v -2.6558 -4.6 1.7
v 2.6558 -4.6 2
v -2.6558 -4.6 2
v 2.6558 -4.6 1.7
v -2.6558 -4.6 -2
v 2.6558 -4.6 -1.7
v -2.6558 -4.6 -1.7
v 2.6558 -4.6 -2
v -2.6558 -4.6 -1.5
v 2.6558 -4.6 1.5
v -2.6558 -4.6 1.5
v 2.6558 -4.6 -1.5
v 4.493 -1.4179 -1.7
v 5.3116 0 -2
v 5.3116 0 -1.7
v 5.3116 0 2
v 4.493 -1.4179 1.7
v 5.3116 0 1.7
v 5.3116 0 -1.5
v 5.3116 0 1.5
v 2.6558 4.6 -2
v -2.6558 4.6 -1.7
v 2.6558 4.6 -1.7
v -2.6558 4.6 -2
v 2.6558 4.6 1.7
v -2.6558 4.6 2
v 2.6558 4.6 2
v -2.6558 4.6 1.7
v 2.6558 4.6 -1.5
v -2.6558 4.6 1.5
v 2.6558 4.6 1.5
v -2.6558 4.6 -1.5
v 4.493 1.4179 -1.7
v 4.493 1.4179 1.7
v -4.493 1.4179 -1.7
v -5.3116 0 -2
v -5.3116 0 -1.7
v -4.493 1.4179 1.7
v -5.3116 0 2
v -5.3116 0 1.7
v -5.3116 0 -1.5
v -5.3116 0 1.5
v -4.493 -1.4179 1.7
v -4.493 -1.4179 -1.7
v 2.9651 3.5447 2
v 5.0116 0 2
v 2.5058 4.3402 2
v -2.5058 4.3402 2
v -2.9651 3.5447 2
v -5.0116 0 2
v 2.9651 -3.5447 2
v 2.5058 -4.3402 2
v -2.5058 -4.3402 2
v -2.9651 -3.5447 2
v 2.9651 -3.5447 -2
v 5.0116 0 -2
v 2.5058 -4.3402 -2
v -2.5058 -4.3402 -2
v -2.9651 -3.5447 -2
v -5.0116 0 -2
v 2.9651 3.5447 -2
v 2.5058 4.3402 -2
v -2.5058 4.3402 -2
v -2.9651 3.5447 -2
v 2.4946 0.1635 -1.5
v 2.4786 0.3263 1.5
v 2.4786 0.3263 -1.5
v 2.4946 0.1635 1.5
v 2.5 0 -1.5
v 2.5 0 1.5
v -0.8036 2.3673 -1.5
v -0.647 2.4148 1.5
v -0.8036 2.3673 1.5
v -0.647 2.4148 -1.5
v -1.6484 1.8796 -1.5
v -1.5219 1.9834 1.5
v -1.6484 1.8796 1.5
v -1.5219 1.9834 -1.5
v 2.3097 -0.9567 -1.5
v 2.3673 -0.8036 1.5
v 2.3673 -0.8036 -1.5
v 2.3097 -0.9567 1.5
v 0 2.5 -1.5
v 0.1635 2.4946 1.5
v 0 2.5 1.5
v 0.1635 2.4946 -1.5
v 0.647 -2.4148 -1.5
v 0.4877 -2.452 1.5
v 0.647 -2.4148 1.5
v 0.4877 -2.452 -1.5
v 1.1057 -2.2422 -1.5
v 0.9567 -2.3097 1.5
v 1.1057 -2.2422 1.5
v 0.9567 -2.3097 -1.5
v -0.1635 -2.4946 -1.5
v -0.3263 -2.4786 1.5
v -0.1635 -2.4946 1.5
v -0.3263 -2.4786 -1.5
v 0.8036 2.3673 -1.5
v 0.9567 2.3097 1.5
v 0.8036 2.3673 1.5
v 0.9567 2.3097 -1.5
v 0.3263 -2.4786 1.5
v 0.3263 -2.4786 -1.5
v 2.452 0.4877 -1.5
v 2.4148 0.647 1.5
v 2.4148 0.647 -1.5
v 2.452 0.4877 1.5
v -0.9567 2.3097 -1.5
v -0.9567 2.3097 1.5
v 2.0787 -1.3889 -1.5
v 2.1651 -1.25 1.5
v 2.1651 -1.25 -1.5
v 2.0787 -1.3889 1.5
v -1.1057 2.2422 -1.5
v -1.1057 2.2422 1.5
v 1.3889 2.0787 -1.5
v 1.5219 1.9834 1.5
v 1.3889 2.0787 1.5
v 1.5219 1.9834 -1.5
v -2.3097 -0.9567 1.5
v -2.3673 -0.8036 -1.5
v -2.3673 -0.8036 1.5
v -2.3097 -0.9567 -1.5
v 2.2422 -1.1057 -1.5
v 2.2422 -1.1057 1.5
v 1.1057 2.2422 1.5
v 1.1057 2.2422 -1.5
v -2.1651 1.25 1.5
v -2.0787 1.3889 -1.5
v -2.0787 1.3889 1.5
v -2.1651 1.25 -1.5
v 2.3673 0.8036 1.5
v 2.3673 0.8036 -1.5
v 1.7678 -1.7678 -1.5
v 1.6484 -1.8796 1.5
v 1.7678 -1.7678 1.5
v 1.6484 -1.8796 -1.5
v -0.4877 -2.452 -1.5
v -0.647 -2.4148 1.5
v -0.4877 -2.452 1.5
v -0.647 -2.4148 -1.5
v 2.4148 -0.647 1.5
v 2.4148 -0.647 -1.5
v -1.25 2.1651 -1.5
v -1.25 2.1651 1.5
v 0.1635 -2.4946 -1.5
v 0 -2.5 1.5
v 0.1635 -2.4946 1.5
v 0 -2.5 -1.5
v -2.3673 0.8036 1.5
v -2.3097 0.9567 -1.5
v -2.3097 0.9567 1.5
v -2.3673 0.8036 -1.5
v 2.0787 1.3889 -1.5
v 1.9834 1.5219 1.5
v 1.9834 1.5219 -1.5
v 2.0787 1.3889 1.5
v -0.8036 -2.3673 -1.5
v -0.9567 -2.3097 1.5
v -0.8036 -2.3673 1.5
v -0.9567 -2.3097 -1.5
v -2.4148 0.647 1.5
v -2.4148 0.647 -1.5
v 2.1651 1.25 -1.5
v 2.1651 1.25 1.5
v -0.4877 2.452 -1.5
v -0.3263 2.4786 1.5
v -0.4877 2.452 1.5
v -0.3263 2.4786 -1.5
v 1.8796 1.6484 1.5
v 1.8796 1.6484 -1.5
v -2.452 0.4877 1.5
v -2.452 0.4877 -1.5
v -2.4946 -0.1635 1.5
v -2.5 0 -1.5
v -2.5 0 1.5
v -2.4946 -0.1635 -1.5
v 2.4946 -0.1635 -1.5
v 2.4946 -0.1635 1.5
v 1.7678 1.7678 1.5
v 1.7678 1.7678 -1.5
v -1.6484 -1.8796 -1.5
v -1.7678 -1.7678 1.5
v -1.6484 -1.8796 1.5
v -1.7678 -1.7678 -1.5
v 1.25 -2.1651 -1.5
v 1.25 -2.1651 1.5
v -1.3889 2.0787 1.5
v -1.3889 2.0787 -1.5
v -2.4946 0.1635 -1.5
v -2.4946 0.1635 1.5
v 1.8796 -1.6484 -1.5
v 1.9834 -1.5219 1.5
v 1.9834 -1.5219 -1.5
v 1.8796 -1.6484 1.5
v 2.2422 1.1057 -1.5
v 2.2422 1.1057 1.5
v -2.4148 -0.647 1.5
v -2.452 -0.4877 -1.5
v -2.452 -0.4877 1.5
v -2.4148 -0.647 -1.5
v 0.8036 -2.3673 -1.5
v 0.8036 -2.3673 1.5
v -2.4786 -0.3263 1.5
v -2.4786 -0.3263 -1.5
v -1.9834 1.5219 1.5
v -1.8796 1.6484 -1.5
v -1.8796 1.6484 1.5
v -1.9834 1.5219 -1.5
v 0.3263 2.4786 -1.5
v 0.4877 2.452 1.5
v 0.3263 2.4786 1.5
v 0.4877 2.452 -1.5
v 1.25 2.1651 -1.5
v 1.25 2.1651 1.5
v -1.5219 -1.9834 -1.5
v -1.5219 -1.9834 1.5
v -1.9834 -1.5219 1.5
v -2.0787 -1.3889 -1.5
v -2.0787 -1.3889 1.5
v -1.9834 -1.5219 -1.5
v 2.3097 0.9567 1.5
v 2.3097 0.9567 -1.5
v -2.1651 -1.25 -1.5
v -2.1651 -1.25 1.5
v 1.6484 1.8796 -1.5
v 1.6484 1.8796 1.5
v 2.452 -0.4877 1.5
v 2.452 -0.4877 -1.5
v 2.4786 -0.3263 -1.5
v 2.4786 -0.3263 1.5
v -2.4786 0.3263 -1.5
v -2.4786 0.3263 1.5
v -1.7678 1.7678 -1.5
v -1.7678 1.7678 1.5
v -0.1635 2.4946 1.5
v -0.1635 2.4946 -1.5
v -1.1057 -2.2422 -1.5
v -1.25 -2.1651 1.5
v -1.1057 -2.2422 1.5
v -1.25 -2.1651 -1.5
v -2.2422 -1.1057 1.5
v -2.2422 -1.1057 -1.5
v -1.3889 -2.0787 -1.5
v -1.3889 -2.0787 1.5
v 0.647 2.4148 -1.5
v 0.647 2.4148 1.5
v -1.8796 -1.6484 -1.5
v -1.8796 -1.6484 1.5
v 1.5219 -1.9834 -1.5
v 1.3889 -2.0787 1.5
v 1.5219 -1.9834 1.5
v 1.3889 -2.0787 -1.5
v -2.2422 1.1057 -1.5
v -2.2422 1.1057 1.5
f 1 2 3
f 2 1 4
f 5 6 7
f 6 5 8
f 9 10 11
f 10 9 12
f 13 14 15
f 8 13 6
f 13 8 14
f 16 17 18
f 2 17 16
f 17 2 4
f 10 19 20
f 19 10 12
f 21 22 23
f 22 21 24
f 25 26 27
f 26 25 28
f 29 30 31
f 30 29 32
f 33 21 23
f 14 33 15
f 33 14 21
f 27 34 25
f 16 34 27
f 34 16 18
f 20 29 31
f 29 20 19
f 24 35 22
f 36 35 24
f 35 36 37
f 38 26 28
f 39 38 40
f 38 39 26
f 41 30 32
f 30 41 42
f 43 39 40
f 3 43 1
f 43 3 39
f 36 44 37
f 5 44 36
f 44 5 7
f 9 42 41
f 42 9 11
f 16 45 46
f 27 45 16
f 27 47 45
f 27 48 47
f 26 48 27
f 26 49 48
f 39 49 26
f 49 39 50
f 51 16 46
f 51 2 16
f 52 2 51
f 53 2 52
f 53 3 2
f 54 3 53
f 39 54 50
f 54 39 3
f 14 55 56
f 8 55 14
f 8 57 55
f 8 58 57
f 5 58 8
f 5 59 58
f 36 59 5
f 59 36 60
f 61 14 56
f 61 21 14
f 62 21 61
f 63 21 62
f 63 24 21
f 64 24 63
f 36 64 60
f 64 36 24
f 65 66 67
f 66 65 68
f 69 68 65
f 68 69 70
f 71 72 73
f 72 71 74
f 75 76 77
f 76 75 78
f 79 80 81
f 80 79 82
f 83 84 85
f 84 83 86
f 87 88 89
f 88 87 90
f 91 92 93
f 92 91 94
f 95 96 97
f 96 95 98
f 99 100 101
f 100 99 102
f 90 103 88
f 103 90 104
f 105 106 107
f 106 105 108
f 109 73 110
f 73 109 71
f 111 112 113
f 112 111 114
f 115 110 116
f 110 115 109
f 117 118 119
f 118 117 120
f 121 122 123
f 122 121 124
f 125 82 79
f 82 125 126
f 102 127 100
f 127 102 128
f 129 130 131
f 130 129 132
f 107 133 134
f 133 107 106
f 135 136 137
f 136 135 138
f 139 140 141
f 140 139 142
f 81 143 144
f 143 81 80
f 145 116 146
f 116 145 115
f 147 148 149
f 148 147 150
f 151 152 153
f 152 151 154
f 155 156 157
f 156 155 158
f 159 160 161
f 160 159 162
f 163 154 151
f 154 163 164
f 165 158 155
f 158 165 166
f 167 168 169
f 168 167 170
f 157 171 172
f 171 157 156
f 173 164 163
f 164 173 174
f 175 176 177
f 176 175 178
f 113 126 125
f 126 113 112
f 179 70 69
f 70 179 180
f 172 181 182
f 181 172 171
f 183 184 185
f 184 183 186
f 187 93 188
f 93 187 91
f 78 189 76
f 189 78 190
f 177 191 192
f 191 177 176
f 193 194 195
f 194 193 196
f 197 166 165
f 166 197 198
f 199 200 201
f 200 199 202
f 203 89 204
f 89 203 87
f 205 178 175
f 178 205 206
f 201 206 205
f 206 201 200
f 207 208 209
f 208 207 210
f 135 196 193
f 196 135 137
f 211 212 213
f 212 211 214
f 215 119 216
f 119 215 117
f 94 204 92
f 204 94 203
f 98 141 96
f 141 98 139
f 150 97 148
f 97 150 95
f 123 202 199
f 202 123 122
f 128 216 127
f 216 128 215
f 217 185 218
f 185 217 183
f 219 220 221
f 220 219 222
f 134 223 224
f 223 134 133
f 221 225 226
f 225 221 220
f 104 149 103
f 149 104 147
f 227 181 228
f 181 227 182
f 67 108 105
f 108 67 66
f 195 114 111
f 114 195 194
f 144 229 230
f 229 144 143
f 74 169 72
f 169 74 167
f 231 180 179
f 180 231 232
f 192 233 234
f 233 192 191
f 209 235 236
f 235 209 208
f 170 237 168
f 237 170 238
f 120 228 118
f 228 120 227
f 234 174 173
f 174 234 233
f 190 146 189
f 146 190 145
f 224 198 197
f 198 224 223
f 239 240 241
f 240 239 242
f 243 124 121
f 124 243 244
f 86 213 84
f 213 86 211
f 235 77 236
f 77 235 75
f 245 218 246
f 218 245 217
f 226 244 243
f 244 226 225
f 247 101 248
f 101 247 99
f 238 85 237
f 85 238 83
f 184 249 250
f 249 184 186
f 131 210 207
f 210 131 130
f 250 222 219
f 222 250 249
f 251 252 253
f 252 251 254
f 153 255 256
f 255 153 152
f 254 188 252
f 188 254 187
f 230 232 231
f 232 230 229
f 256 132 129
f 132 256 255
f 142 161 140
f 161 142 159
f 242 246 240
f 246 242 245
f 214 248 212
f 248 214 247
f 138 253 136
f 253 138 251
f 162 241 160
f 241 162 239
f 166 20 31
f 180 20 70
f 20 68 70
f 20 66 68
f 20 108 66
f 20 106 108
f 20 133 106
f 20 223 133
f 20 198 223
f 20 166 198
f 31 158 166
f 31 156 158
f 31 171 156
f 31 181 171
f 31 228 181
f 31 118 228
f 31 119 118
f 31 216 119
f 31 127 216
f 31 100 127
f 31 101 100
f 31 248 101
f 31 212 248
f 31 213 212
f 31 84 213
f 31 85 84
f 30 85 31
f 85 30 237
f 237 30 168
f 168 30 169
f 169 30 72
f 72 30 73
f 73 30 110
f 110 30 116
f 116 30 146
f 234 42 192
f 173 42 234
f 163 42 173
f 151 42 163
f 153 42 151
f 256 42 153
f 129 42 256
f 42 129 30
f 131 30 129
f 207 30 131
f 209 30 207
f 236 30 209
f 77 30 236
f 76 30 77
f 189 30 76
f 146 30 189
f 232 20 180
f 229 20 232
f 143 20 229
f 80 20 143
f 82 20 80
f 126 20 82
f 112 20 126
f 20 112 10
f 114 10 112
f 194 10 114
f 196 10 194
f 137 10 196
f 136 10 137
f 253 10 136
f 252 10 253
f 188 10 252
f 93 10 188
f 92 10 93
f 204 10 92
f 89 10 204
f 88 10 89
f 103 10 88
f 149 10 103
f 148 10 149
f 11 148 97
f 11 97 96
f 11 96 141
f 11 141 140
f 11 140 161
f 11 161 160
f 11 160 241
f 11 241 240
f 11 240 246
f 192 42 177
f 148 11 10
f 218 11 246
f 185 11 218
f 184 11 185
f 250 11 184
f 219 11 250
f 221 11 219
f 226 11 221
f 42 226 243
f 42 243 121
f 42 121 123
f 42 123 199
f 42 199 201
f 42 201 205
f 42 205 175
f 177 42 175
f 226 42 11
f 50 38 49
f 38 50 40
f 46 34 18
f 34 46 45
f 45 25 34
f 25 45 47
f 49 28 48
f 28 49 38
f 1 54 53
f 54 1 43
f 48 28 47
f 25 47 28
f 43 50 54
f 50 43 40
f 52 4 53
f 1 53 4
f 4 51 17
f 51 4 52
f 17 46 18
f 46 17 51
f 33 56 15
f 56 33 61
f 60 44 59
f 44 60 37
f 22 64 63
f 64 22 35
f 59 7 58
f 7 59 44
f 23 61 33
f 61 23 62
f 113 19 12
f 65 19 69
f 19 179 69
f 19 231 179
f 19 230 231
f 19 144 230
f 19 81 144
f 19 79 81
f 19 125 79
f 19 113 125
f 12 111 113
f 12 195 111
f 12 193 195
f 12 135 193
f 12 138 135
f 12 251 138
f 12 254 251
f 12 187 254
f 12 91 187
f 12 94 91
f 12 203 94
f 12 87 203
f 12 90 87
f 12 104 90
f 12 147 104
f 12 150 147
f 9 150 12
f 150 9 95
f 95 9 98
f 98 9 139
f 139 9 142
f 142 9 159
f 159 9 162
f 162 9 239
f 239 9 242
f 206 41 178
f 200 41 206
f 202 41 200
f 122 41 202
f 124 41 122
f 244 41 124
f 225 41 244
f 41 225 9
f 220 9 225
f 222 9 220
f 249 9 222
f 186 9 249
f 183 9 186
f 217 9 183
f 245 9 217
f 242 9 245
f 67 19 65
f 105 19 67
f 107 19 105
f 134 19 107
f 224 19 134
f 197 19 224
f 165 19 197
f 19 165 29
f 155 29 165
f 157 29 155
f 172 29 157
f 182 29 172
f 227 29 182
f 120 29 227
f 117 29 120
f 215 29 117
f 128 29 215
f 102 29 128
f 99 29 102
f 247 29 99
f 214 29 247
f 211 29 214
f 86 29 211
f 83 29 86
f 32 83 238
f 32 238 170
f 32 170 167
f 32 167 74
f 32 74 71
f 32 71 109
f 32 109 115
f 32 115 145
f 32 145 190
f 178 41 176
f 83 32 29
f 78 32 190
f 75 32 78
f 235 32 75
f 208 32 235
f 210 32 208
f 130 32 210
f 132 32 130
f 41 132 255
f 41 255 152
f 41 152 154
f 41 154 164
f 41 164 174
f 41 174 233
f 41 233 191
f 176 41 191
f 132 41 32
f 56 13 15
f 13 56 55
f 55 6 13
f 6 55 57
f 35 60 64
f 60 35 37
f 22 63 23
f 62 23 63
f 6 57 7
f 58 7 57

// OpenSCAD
// Hex nut for 5.0mm screws: 9.2mm across flats, 4.0mm thick, 5.0mm through hole

across_flats   = 9.2;   // mm
thickness      = 4.0;   // mm
hole_diameter  = 5.0;   // mm
chamfer_size   = 0.4;   // mm (per face)
overlap        = 0.2;   // mm (boolean safety overlap)

// Derived
hex_R  = across_flats / sqrt(3);  // circumradius for a hex with given across-flats
hole_r = hole_diameter / 2;

module hex_nut() {
    difference() {
        // Outer hex prism (flats aligned to X/Y so top/bottom views are hex)
        cylinder(r=hex_R, h=thickness, center=true, $fn=6);

        // Through hole
        cylinder(r=hole_r, h=thickness + 2*overlap, center=true, $fn=96);

        // Top chamfer (remove material near outer edge)
        translate([0, 0, thickness/2 - chamfer_size/2])
            cylinder(
                r1 = hex_R + overlap,
                r2 = max(hole_r, hex_R - chamfer_size),
                h  = chamfer_size + overlap,
                center = true,
                $fn = 6
            );

        // Bottom chamfer
        translate([0, 0, -thickness/2 + chamfer_size/2])
            cylinder(
                r1 = max(hole_r, hex_R - chamfer_size),
                r2 = hex_R + overlap,
                h  = chamfer_size + overlap,
                center = true,
                $fn = 6
            );
    }
}

color("Silver") hex_nut();
